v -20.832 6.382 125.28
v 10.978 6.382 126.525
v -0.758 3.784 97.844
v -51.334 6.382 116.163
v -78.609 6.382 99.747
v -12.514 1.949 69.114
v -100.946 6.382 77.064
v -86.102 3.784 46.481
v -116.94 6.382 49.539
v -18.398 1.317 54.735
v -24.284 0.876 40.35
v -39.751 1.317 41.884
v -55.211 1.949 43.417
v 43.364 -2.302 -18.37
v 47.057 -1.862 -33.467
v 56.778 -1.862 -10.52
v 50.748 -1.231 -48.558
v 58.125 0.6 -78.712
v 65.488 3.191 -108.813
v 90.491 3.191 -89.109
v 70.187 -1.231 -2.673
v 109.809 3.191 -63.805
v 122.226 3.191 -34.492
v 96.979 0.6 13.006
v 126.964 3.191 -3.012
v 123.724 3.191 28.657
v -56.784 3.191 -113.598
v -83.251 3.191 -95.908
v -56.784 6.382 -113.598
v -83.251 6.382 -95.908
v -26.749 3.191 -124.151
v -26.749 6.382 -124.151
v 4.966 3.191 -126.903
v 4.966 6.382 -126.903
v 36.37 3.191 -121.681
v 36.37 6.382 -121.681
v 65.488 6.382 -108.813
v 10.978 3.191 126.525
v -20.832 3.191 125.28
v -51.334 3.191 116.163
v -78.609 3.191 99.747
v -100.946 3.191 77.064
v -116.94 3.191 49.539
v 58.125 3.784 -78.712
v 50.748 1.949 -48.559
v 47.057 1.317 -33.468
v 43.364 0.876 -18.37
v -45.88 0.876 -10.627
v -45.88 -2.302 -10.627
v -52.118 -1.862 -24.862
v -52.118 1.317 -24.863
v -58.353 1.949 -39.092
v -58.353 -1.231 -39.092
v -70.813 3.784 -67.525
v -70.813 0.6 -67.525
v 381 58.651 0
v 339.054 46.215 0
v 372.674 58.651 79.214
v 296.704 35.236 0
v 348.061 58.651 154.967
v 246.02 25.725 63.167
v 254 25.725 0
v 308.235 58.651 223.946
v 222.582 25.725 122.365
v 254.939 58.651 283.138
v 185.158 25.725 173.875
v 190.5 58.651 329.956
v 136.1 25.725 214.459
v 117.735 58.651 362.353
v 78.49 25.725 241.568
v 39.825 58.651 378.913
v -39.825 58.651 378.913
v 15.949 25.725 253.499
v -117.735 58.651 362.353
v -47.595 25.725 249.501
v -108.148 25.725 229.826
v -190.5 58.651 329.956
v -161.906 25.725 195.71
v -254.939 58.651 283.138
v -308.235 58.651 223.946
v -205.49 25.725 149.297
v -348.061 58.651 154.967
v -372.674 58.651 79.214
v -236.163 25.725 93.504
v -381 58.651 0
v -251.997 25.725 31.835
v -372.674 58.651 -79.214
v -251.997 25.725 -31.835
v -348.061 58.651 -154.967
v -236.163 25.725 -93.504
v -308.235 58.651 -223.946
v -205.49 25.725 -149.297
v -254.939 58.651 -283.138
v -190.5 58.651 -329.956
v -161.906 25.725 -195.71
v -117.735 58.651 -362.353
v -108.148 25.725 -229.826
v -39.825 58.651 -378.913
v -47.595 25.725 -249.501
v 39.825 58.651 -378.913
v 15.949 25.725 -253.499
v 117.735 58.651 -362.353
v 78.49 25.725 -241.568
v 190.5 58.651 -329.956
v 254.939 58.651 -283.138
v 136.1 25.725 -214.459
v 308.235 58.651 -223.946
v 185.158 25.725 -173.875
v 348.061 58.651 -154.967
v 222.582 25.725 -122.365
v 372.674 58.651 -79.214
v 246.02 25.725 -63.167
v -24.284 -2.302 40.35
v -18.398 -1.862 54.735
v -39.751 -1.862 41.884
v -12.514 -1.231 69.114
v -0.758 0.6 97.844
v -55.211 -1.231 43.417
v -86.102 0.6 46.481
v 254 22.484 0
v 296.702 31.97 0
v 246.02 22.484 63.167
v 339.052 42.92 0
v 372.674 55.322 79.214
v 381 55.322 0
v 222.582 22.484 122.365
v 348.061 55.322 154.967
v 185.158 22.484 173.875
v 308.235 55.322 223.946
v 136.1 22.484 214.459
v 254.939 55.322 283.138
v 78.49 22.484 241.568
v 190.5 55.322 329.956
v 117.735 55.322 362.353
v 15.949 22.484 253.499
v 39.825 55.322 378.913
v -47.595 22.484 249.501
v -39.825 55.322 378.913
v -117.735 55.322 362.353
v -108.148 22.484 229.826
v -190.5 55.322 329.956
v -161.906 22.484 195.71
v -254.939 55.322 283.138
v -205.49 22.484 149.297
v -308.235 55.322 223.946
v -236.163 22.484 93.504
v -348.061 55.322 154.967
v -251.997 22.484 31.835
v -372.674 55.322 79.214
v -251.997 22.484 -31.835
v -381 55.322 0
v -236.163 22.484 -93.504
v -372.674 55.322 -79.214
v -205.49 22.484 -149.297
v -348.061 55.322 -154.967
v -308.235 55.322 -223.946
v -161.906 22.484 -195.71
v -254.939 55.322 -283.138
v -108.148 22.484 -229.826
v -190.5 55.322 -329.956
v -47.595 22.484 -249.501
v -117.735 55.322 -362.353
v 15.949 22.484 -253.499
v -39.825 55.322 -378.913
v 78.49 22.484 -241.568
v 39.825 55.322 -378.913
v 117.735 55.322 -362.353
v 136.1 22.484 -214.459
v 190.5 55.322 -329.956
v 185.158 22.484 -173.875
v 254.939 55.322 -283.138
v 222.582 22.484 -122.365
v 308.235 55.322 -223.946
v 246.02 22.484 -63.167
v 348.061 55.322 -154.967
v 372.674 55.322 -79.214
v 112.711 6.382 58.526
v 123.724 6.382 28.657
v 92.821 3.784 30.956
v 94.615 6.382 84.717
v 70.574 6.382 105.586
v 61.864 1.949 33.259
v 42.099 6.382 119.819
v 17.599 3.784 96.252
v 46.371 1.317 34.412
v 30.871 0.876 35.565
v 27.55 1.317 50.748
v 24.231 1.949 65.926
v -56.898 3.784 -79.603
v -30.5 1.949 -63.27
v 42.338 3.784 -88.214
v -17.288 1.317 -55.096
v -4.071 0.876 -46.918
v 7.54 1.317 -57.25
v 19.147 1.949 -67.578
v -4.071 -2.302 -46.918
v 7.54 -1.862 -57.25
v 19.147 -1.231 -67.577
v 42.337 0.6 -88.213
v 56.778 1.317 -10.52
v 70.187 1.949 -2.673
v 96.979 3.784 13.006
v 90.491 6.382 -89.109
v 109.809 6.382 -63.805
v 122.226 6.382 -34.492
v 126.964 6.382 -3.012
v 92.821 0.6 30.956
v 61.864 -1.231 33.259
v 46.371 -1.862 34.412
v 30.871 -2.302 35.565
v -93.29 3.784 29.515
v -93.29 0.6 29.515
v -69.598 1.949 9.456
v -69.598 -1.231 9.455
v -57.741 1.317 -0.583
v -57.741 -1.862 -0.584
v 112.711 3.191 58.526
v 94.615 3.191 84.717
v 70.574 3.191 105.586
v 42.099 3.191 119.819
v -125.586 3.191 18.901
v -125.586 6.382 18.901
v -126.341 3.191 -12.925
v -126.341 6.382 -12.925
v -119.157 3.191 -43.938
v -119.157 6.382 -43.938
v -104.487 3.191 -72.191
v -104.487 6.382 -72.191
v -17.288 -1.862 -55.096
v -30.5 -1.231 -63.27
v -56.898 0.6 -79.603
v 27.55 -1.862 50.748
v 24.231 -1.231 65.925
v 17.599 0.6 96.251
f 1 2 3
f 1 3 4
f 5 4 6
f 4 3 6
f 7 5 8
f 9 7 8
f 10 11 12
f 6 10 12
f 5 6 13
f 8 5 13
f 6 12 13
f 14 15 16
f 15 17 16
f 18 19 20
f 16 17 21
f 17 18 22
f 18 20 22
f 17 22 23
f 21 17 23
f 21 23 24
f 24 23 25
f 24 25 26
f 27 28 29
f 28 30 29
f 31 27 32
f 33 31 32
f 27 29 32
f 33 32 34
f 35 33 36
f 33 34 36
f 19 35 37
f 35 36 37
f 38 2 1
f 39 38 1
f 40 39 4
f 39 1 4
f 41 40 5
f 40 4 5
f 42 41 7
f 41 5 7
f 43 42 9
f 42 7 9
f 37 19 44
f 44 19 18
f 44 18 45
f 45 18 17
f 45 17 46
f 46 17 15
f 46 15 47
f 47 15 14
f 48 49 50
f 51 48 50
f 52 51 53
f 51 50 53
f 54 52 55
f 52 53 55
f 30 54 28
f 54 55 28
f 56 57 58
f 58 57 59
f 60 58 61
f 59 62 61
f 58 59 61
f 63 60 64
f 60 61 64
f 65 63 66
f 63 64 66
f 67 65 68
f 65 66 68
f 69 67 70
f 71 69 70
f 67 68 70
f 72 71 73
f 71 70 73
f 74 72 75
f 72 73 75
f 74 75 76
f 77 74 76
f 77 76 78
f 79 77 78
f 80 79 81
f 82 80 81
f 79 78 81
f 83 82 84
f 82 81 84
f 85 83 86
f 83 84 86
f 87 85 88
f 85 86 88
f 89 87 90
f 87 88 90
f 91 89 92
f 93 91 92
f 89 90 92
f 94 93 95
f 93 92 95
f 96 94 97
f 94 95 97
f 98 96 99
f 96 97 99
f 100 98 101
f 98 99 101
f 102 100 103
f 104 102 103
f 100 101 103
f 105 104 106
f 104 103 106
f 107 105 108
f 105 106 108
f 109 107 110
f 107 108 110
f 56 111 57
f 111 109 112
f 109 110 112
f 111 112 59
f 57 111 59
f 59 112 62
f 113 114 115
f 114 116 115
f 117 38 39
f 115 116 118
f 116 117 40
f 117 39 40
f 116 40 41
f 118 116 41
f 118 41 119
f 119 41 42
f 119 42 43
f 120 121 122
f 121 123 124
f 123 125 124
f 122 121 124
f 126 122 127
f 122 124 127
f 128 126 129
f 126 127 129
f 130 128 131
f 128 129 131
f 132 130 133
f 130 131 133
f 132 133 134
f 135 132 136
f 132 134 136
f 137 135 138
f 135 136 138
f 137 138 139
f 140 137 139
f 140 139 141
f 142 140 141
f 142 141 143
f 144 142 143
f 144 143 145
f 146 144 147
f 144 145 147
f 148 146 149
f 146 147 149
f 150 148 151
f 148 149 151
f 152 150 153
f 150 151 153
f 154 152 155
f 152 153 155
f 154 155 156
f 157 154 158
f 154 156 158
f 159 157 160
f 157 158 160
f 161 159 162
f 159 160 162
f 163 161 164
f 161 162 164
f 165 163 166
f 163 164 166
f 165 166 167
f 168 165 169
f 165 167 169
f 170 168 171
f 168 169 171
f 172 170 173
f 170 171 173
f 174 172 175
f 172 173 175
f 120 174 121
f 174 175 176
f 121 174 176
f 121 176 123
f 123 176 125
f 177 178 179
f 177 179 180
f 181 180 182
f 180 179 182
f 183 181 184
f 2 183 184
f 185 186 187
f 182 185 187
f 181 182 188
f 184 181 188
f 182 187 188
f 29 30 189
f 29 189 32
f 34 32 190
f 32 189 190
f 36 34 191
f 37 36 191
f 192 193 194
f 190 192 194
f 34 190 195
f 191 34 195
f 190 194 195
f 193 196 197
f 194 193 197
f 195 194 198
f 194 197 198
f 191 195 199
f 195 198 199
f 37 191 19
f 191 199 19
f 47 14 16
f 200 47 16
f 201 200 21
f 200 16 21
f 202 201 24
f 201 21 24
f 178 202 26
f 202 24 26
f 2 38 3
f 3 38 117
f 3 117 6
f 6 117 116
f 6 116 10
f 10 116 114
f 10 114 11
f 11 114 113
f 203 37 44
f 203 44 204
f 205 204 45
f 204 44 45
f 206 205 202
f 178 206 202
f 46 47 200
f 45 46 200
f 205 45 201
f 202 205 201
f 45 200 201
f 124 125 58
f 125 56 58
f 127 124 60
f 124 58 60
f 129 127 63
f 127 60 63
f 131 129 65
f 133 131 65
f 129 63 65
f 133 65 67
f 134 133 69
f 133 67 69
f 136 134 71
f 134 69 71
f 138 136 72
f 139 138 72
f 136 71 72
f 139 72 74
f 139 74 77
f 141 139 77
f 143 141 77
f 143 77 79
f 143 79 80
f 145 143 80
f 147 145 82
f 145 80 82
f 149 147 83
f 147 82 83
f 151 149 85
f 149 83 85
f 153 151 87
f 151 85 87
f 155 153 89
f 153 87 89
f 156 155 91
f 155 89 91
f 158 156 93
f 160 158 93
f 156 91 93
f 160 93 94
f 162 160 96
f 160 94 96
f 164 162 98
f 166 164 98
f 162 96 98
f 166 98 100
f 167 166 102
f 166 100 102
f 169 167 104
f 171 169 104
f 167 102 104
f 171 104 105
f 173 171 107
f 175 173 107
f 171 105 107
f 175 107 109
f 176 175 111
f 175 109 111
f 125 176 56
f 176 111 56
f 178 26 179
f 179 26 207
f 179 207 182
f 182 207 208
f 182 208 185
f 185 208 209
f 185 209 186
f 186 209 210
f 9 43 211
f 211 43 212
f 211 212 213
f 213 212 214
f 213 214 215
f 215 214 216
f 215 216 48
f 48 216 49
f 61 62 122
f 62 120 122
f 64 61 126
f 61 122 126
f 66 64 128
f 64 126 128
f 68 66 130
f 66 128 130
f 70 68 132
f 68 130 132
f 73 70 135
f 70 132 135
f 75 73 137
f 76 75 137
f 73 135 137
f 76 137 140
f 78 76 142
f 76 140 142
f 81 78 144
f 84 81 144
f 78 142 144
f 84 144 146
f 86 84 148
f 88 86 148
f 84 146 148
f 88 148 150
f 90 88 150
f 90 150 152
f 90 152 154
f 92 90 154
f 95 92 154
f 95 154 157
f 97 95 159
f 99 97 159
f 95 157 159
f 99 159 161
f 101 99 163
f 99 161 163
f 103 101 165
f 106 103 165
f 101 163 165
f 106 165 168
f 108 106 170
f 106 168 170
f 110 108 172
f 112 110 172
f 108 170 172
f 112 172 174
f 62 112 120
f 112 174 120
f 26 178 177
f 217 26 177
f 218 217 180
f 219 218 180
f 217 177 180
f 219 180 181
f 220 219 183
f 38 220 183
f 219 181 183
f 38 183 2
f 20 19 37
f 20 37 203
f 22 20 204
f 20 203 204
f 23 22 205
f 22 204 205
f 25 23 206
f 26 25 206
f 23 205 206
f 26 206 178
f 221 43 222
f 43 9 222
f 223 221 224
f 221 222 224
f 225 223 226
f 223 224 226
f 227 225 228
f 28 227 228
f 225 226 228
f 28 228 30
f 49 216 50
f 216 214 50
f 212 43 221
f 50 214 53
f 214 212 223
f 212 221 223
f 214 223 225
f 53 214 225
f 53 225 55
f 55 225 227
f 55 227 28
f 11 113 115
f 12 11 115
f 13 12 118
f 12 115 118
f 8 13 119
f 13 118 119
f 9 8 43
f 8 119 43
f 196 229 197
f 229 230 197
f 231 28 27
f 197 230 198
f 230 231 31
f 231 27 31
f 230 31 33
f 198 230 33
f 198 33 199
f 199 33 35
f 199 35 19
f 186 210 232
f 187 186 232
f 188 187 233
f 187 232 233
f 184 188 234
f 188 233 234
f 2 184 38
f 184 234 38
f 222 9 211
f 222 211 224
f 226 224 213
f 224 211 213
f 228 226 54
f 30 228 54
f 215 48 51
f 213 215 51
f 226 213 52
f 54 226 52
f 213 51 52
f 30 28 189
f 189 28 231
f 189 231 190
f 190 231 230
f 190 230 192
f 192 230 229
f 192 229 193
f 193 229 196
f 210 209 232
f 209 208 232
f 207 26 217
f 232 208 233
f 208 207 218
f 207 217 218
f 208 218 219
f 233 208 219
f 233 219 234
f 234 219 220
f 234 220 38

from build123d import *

# Parameters (mm, degrees)
F4_DEPTH = 84.0519311569


with BuildPart() as f1:
    # F0 (on Top) → F1 (revolve)
    with BuildSketch(Plane.XY):
        with BuildLine():
            ThreePointArc((254, 22.4842106661), (317.9242576763, 37.2624085143), (381, 55.3222142005))
            Line((381, 55.3222142005), (381, 58.6509311569))
            ThreePointArc((381, 58.6509311569), (317.9265350577, 40.5426919929), (254, 25.7248506869))
            Line((254, 25.7248506869), (254, 22.4842106661))
        make_face()
    revolve(axis=Axis((0, 0, 0), (0, -1, 0)))


with BuildPart() as f1b:
    # F0 (on Top) → F1, piece 2 (revolve)
    with BuildSketch(Plane.XY):
        with BuildLine():
            Line((0, 0), (0, -3.175))
            ThreePointArc((0, -3.175), (63.5797243259, -1.5825128501), (127, 3.1909548746))
            Line((127, 3.1909548746), (127, 6.3819903304))
            ThreePointArc((127, 6.3819903304), (63.5801262199, 1.5965035714), (0, 0))
        make_face()
    revolve(axis=Axis((0, 0, 0), (0, -1, 0)))

    # F3 (on offset) → F4 (cut, through all)
    with BuildSketch(Plane.XZ.offset(25.4)):
        Polygon((43.3636103, -18.3700851417), (37.1173459995, 8.5972452537), (30.871081699, 35.564575649), (3.2934245792, 37.9573886686), (-24.2842325405, 40.3502016882), (-35.0818976702, 14.8617110677), (-45.8795627998, -10.6267795528), (-24.9752297293, -28.7723460978), (-4.0708966587, -46.9179126428), (19.6463568206, -32.6439988922), align=None)
        Polygon((30.871081699, 35.564575649), (10.9780819308, 126.5246288954), (3.2934245792, 37.9573886686), align=None)
        Polygon((3.2934245792, 37.9573886686), (10.9780819308, 126.5246288954), (-24.2842325405, 40.3502016882), align=None)
        Polygon((-24.2842325405, 40.3502016882), (-116.9396589005, 49.5390368924), (-35.0818976702, 14.8617110677), align=None)
        Polygon((-35.0818976702, 14.8617110677), (-116.9396589005, 49.5390368924), (-45.8795627998, -10.6267795528), align=None)
        Polygon((-45.8795627998, -10.6267795528), (-83.2507657642, -95.907820326), (-24.9752297293, -28.7723460978), align=None)
        Polygon((-24.9752297293, -28.7723460978), (-83.2507657642, -95.907820326), (-4.0708966587, -46.9179126428), align=None)
        Polygon((19.6463568206, -32.6439988922), (65.4878560688, -108.8133296408), (43.3636103, -18.3700851417), align=None)
        Polygon((-4.0708966587, -46.9179126428), (65.4878560688, -108.8133296408), (19.6463568206, -32.6439988922), align=None)
        Polygon((37.1173459995, 8.5972452537), (123.7244866651, 28.6574841789), (30.871081699, 35.564575649), align=None)
        Polygon((43.3636103, -18.3700851417), (123.7244866651, 28.6574841789), (37.1173459995, 8.5972452537), align=None)
    extrude(amount=-F4_DEPTH, mode=Mode.SUBTRACT)


solid = Compound([f1.part, f1b.part])
